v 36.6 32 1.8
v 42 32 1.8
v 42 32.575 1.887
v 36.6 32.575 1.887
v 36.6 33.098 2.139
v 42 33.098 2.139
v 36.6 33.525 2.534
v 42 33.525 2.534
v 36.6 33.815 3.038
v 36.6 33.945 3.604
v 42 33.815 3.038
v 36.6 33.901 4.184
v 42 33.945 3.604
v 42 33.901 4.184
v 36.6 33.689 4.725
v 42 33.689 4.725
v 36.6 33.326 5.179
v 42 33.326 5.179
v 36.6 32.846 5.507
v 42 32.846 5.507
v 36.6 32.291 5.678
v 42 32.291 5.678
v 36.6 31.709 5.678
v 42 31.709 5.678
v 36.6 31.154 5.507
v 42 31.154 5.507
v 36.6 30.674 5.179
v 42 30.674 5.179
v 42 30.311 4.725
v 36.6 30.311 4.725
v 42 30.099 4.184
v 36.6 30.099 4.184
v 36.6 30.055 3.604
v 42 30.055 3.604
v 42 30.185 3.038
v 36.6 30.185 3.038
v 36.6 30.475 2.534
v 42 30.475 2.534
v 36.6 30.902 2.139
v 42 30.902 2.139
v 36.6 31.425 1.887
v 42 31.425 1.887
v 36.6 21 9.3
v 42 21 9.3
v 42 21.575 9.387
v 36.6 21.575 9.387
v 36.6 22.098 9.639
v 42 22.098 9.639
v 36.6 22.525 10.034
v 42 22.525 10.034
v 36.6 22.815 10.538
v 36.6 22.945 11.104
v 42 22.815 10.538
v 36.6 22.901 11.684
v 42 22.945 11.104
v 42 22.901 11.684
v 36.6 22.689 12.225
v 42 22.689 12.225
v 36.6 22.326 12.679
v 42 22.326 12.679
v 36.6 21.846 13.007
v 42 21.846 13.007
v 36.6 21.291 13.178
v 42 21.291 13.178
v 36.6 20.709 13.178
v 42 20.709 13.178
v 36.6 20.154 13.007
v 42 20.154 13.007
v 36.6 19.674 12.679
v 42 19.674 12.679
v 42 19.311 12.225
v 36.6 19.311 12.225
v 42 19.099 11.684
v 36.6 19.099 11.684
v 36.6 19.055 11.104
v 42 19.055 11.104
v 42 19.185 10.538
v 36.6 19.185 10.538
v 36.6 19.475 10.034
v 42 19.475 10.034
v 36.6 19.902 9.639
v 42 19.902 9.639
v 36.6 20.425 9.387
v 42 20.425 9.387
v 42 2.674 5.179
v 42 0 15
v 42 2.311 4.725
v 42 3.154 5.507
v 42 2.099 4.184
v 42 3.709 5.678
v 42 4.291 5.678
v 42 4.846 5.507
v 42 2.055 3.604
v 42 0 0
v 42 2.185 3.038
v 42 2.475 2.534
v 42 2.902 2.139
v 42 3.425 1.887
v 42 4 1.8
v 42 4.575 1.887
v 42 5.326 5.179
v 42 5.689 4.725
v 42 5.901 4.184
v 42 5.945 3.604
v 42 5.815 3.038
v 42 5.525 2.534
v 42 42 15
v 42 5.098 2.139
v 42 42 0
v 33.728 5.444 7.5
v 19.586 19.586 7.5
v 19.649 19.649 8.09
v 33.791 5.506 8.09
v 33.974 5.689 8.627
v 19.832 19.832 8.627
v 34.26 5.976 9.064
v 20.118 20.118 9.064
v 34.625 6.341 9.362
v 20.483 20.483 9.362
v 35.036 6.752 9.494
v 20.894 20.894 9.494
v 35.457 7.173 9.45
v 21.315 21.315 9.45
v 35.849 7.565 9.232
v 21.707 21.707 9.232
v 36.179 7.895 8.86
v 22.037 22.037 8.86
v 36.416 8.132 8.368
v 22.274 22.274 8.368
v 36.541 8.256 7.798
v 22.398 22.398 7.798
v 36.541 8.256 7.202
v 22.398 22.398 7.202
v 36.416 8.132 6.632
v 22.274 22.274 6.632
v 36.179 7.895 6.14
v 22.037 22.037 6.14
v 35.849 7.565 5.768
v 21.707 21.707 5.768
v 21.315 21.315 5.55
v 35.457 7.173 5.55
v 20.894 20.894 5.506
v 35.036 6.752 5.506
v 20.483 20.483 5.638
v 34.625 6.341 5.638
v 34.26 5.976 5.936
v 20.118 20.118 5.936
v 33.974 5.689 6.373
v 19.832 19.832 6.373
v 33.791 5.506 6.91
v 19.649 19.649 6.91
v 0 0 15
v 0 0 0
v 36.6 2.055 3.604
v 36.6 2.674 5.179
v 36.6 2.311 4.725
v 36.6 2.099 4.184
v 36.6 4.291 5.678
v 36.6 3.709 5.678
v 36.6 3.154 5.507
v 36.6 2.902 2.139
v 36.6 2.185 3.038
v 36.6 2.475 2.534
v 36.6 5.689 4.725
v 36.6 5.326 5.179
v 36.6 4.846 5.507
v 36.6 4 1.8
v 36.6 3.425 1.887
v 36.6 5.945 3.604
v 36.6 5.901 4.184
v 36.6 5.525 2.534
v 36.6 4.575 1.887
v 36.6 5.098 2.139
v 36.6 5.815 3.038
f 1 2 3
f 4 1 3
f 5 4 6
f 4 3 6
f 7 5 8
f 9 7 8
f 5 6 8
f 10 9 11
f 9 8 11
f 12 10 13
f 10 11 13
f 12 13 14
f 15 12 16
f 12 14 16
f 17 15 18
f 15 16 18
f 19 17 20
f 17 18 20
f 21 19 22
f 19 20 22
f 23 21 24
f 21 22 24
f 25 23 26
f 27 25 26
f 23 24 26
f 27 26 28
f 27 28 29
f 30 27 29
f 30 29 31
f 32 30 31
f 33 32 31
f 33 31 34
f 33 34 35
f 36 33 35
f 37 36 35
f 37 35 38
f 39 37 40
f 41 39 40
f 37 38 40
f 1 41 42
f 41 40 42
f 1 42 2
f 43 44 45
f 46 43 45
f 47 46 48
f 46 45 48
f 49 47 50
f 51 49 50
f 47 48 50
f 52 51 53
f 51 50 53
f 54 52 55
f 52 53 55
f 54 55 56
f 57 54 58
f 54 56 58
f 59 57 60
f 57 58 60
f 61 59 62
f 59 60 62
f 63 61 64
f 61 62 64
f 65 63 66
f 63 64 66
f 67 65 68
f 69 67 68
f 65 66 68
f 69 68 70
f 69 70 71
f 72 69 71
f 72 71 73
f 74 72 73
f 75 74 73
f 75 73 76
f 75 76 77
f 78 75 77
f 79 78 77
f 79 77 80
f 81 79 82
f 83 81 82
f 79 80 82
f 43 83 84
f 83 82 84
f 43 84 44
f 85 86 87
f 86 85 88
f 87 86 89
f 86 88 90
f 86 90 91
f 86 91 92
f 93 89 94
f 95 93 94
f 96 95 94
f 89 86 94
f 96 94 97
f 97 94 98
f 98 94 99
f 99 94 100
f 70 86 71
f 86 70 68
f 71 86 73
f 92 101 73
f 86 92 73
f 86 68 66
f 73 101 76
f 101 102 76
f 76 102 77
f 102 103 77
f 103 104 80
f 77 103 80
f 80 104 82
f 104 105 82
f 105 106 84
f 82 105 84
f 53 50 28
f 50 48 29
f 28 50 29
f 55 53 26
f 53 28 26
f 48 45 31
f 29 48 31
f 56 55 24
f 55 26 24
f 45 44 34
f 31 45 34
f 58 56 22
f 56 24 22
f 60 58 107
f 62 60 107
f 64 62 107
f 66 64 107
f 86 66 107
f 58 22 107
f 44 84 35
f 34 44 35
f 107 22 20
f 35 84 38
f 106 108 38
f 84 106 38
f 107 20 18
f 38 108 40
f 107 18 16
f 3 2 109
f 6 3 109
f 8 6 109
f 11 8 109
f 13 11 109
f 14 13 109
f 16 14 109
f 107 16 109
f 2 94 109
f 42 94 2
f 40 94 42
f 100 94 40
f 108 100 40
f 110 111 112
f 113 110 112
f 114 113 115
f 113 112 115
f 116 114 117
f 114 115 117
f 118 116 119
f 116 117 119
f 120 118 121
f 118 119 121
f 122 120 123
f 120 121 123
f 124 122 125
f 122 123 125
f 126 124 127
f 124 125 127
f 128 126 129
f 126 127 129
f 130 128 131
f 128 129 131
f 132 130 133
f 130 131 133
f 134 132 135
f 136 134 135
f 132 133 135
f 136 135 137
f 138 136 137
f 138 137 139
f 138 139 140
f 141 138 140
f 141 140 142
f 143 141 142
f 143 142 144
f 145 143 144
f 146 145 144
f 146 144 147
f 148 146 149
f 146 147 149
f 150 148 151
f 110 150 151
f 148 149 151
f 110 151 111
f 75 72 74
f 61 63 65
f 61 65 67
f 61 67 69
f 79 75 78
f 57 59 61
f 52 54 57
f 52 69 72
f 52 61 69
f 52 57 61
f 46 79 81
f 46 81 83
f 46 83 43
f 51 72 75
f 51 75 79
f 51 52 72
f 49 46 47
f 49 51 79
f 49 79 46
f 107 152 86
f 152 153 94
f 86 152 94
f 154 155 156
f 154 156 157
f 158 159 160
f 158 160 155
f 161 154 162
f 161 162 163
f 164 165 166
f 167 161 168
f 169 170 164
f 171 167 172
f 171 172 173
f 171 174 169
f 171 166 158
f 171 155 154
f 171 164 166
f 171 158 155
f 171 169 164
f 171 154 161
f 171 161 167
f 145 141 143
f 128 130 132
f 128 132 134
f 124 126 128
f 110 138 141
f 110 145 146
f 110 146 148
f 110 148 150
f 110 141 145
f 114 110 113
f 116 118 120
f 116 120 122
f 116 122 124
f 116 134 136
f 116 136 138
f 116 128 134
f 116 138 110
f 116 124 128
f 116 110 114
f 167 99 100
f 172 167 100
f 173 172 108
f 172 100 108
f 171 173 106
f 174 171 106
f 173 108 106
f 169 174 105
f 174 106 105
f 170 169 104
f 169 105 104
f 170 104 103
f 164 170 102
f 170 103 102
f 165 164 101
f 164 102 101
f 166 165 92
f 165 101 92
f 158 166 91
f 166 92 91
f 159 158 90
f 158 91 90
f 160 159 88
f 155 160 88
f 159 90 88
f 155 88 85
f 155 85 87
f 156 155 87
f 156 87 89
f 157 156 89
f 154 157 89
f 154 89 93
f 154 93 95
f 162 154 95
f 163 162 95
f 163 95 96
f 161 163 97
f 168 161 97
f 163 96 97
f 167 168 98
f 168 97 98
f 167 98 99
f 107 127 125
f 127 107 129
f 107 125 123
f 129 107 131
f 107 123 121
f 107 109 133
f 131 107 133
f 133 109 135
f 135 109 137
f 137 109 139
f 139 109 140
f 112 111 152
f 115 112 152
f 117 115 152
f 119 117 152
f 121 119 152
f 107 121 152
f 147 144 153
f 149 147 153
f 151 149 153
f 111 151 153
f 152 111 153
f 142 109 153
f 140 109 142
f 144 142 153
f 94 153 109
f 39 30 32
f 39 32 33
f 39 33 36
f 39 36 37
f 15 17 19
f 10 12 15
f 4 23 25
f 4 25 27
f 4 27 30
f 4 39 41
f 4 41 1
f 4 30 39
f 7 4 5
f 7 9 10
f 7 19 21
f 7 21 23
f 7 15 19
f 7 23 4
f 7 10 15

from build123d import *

# Parameters (mm, degrees)
BOSS_EXTRUDE1_DEPTH = 15
SKETCH3_R           = 2
CUT_EXTRUDE1_DEPTH  = 20
SKETCH4_R           = 1.95
CUT_EXTRUDE2_DEPTH  = 5.4


with BuildPart() as part:
    # Sketch1 → Boss-Extrude1 (new body)
    with BuildSketch(Plane.XY):
        Polygon((0, 0), (42, 0), (42, 42), align=None)
    extrude(amount=BOSS_EXTRUDE1_DEPTH)

    # Sketch3 → Cut-Extrude1 (cut)
    with BuildSketch(Plane(origin=(0, 0, 0), x_dir=(0, 0, 1), z_dir=(-0.7071067811865477, 0.7071067811865475, 0))):
        with Locations(Location((7.5, 29.69848481, 0), (0, 0, 270))):
            Circle(SKETCH3_R)
    extrude(amount=-CUT_EXTRUDE1_DEPTH, mode=Mode.SUBTRACT)

    # Sketch4 → Cut-Extrude2 (cut)
    with BuildSketch(Plane(origin=(42, 0, 0), x_dir=(0, 0, -1), z_dir=(1, 0, 0))):
        with Locations((-11.25, 21)):
            Circle(SKETCH4_R)
        with Locations((-3.75, 4)):
            Circle(SKETCH4_R)
        with Locations((-3.75, 32)):
            Circle(SKETCH4_R)
    extrude(amount=-CUT_EXTRUDE2_DEPTH, mode=Mode.SUBTRACT)


solid = part.part
